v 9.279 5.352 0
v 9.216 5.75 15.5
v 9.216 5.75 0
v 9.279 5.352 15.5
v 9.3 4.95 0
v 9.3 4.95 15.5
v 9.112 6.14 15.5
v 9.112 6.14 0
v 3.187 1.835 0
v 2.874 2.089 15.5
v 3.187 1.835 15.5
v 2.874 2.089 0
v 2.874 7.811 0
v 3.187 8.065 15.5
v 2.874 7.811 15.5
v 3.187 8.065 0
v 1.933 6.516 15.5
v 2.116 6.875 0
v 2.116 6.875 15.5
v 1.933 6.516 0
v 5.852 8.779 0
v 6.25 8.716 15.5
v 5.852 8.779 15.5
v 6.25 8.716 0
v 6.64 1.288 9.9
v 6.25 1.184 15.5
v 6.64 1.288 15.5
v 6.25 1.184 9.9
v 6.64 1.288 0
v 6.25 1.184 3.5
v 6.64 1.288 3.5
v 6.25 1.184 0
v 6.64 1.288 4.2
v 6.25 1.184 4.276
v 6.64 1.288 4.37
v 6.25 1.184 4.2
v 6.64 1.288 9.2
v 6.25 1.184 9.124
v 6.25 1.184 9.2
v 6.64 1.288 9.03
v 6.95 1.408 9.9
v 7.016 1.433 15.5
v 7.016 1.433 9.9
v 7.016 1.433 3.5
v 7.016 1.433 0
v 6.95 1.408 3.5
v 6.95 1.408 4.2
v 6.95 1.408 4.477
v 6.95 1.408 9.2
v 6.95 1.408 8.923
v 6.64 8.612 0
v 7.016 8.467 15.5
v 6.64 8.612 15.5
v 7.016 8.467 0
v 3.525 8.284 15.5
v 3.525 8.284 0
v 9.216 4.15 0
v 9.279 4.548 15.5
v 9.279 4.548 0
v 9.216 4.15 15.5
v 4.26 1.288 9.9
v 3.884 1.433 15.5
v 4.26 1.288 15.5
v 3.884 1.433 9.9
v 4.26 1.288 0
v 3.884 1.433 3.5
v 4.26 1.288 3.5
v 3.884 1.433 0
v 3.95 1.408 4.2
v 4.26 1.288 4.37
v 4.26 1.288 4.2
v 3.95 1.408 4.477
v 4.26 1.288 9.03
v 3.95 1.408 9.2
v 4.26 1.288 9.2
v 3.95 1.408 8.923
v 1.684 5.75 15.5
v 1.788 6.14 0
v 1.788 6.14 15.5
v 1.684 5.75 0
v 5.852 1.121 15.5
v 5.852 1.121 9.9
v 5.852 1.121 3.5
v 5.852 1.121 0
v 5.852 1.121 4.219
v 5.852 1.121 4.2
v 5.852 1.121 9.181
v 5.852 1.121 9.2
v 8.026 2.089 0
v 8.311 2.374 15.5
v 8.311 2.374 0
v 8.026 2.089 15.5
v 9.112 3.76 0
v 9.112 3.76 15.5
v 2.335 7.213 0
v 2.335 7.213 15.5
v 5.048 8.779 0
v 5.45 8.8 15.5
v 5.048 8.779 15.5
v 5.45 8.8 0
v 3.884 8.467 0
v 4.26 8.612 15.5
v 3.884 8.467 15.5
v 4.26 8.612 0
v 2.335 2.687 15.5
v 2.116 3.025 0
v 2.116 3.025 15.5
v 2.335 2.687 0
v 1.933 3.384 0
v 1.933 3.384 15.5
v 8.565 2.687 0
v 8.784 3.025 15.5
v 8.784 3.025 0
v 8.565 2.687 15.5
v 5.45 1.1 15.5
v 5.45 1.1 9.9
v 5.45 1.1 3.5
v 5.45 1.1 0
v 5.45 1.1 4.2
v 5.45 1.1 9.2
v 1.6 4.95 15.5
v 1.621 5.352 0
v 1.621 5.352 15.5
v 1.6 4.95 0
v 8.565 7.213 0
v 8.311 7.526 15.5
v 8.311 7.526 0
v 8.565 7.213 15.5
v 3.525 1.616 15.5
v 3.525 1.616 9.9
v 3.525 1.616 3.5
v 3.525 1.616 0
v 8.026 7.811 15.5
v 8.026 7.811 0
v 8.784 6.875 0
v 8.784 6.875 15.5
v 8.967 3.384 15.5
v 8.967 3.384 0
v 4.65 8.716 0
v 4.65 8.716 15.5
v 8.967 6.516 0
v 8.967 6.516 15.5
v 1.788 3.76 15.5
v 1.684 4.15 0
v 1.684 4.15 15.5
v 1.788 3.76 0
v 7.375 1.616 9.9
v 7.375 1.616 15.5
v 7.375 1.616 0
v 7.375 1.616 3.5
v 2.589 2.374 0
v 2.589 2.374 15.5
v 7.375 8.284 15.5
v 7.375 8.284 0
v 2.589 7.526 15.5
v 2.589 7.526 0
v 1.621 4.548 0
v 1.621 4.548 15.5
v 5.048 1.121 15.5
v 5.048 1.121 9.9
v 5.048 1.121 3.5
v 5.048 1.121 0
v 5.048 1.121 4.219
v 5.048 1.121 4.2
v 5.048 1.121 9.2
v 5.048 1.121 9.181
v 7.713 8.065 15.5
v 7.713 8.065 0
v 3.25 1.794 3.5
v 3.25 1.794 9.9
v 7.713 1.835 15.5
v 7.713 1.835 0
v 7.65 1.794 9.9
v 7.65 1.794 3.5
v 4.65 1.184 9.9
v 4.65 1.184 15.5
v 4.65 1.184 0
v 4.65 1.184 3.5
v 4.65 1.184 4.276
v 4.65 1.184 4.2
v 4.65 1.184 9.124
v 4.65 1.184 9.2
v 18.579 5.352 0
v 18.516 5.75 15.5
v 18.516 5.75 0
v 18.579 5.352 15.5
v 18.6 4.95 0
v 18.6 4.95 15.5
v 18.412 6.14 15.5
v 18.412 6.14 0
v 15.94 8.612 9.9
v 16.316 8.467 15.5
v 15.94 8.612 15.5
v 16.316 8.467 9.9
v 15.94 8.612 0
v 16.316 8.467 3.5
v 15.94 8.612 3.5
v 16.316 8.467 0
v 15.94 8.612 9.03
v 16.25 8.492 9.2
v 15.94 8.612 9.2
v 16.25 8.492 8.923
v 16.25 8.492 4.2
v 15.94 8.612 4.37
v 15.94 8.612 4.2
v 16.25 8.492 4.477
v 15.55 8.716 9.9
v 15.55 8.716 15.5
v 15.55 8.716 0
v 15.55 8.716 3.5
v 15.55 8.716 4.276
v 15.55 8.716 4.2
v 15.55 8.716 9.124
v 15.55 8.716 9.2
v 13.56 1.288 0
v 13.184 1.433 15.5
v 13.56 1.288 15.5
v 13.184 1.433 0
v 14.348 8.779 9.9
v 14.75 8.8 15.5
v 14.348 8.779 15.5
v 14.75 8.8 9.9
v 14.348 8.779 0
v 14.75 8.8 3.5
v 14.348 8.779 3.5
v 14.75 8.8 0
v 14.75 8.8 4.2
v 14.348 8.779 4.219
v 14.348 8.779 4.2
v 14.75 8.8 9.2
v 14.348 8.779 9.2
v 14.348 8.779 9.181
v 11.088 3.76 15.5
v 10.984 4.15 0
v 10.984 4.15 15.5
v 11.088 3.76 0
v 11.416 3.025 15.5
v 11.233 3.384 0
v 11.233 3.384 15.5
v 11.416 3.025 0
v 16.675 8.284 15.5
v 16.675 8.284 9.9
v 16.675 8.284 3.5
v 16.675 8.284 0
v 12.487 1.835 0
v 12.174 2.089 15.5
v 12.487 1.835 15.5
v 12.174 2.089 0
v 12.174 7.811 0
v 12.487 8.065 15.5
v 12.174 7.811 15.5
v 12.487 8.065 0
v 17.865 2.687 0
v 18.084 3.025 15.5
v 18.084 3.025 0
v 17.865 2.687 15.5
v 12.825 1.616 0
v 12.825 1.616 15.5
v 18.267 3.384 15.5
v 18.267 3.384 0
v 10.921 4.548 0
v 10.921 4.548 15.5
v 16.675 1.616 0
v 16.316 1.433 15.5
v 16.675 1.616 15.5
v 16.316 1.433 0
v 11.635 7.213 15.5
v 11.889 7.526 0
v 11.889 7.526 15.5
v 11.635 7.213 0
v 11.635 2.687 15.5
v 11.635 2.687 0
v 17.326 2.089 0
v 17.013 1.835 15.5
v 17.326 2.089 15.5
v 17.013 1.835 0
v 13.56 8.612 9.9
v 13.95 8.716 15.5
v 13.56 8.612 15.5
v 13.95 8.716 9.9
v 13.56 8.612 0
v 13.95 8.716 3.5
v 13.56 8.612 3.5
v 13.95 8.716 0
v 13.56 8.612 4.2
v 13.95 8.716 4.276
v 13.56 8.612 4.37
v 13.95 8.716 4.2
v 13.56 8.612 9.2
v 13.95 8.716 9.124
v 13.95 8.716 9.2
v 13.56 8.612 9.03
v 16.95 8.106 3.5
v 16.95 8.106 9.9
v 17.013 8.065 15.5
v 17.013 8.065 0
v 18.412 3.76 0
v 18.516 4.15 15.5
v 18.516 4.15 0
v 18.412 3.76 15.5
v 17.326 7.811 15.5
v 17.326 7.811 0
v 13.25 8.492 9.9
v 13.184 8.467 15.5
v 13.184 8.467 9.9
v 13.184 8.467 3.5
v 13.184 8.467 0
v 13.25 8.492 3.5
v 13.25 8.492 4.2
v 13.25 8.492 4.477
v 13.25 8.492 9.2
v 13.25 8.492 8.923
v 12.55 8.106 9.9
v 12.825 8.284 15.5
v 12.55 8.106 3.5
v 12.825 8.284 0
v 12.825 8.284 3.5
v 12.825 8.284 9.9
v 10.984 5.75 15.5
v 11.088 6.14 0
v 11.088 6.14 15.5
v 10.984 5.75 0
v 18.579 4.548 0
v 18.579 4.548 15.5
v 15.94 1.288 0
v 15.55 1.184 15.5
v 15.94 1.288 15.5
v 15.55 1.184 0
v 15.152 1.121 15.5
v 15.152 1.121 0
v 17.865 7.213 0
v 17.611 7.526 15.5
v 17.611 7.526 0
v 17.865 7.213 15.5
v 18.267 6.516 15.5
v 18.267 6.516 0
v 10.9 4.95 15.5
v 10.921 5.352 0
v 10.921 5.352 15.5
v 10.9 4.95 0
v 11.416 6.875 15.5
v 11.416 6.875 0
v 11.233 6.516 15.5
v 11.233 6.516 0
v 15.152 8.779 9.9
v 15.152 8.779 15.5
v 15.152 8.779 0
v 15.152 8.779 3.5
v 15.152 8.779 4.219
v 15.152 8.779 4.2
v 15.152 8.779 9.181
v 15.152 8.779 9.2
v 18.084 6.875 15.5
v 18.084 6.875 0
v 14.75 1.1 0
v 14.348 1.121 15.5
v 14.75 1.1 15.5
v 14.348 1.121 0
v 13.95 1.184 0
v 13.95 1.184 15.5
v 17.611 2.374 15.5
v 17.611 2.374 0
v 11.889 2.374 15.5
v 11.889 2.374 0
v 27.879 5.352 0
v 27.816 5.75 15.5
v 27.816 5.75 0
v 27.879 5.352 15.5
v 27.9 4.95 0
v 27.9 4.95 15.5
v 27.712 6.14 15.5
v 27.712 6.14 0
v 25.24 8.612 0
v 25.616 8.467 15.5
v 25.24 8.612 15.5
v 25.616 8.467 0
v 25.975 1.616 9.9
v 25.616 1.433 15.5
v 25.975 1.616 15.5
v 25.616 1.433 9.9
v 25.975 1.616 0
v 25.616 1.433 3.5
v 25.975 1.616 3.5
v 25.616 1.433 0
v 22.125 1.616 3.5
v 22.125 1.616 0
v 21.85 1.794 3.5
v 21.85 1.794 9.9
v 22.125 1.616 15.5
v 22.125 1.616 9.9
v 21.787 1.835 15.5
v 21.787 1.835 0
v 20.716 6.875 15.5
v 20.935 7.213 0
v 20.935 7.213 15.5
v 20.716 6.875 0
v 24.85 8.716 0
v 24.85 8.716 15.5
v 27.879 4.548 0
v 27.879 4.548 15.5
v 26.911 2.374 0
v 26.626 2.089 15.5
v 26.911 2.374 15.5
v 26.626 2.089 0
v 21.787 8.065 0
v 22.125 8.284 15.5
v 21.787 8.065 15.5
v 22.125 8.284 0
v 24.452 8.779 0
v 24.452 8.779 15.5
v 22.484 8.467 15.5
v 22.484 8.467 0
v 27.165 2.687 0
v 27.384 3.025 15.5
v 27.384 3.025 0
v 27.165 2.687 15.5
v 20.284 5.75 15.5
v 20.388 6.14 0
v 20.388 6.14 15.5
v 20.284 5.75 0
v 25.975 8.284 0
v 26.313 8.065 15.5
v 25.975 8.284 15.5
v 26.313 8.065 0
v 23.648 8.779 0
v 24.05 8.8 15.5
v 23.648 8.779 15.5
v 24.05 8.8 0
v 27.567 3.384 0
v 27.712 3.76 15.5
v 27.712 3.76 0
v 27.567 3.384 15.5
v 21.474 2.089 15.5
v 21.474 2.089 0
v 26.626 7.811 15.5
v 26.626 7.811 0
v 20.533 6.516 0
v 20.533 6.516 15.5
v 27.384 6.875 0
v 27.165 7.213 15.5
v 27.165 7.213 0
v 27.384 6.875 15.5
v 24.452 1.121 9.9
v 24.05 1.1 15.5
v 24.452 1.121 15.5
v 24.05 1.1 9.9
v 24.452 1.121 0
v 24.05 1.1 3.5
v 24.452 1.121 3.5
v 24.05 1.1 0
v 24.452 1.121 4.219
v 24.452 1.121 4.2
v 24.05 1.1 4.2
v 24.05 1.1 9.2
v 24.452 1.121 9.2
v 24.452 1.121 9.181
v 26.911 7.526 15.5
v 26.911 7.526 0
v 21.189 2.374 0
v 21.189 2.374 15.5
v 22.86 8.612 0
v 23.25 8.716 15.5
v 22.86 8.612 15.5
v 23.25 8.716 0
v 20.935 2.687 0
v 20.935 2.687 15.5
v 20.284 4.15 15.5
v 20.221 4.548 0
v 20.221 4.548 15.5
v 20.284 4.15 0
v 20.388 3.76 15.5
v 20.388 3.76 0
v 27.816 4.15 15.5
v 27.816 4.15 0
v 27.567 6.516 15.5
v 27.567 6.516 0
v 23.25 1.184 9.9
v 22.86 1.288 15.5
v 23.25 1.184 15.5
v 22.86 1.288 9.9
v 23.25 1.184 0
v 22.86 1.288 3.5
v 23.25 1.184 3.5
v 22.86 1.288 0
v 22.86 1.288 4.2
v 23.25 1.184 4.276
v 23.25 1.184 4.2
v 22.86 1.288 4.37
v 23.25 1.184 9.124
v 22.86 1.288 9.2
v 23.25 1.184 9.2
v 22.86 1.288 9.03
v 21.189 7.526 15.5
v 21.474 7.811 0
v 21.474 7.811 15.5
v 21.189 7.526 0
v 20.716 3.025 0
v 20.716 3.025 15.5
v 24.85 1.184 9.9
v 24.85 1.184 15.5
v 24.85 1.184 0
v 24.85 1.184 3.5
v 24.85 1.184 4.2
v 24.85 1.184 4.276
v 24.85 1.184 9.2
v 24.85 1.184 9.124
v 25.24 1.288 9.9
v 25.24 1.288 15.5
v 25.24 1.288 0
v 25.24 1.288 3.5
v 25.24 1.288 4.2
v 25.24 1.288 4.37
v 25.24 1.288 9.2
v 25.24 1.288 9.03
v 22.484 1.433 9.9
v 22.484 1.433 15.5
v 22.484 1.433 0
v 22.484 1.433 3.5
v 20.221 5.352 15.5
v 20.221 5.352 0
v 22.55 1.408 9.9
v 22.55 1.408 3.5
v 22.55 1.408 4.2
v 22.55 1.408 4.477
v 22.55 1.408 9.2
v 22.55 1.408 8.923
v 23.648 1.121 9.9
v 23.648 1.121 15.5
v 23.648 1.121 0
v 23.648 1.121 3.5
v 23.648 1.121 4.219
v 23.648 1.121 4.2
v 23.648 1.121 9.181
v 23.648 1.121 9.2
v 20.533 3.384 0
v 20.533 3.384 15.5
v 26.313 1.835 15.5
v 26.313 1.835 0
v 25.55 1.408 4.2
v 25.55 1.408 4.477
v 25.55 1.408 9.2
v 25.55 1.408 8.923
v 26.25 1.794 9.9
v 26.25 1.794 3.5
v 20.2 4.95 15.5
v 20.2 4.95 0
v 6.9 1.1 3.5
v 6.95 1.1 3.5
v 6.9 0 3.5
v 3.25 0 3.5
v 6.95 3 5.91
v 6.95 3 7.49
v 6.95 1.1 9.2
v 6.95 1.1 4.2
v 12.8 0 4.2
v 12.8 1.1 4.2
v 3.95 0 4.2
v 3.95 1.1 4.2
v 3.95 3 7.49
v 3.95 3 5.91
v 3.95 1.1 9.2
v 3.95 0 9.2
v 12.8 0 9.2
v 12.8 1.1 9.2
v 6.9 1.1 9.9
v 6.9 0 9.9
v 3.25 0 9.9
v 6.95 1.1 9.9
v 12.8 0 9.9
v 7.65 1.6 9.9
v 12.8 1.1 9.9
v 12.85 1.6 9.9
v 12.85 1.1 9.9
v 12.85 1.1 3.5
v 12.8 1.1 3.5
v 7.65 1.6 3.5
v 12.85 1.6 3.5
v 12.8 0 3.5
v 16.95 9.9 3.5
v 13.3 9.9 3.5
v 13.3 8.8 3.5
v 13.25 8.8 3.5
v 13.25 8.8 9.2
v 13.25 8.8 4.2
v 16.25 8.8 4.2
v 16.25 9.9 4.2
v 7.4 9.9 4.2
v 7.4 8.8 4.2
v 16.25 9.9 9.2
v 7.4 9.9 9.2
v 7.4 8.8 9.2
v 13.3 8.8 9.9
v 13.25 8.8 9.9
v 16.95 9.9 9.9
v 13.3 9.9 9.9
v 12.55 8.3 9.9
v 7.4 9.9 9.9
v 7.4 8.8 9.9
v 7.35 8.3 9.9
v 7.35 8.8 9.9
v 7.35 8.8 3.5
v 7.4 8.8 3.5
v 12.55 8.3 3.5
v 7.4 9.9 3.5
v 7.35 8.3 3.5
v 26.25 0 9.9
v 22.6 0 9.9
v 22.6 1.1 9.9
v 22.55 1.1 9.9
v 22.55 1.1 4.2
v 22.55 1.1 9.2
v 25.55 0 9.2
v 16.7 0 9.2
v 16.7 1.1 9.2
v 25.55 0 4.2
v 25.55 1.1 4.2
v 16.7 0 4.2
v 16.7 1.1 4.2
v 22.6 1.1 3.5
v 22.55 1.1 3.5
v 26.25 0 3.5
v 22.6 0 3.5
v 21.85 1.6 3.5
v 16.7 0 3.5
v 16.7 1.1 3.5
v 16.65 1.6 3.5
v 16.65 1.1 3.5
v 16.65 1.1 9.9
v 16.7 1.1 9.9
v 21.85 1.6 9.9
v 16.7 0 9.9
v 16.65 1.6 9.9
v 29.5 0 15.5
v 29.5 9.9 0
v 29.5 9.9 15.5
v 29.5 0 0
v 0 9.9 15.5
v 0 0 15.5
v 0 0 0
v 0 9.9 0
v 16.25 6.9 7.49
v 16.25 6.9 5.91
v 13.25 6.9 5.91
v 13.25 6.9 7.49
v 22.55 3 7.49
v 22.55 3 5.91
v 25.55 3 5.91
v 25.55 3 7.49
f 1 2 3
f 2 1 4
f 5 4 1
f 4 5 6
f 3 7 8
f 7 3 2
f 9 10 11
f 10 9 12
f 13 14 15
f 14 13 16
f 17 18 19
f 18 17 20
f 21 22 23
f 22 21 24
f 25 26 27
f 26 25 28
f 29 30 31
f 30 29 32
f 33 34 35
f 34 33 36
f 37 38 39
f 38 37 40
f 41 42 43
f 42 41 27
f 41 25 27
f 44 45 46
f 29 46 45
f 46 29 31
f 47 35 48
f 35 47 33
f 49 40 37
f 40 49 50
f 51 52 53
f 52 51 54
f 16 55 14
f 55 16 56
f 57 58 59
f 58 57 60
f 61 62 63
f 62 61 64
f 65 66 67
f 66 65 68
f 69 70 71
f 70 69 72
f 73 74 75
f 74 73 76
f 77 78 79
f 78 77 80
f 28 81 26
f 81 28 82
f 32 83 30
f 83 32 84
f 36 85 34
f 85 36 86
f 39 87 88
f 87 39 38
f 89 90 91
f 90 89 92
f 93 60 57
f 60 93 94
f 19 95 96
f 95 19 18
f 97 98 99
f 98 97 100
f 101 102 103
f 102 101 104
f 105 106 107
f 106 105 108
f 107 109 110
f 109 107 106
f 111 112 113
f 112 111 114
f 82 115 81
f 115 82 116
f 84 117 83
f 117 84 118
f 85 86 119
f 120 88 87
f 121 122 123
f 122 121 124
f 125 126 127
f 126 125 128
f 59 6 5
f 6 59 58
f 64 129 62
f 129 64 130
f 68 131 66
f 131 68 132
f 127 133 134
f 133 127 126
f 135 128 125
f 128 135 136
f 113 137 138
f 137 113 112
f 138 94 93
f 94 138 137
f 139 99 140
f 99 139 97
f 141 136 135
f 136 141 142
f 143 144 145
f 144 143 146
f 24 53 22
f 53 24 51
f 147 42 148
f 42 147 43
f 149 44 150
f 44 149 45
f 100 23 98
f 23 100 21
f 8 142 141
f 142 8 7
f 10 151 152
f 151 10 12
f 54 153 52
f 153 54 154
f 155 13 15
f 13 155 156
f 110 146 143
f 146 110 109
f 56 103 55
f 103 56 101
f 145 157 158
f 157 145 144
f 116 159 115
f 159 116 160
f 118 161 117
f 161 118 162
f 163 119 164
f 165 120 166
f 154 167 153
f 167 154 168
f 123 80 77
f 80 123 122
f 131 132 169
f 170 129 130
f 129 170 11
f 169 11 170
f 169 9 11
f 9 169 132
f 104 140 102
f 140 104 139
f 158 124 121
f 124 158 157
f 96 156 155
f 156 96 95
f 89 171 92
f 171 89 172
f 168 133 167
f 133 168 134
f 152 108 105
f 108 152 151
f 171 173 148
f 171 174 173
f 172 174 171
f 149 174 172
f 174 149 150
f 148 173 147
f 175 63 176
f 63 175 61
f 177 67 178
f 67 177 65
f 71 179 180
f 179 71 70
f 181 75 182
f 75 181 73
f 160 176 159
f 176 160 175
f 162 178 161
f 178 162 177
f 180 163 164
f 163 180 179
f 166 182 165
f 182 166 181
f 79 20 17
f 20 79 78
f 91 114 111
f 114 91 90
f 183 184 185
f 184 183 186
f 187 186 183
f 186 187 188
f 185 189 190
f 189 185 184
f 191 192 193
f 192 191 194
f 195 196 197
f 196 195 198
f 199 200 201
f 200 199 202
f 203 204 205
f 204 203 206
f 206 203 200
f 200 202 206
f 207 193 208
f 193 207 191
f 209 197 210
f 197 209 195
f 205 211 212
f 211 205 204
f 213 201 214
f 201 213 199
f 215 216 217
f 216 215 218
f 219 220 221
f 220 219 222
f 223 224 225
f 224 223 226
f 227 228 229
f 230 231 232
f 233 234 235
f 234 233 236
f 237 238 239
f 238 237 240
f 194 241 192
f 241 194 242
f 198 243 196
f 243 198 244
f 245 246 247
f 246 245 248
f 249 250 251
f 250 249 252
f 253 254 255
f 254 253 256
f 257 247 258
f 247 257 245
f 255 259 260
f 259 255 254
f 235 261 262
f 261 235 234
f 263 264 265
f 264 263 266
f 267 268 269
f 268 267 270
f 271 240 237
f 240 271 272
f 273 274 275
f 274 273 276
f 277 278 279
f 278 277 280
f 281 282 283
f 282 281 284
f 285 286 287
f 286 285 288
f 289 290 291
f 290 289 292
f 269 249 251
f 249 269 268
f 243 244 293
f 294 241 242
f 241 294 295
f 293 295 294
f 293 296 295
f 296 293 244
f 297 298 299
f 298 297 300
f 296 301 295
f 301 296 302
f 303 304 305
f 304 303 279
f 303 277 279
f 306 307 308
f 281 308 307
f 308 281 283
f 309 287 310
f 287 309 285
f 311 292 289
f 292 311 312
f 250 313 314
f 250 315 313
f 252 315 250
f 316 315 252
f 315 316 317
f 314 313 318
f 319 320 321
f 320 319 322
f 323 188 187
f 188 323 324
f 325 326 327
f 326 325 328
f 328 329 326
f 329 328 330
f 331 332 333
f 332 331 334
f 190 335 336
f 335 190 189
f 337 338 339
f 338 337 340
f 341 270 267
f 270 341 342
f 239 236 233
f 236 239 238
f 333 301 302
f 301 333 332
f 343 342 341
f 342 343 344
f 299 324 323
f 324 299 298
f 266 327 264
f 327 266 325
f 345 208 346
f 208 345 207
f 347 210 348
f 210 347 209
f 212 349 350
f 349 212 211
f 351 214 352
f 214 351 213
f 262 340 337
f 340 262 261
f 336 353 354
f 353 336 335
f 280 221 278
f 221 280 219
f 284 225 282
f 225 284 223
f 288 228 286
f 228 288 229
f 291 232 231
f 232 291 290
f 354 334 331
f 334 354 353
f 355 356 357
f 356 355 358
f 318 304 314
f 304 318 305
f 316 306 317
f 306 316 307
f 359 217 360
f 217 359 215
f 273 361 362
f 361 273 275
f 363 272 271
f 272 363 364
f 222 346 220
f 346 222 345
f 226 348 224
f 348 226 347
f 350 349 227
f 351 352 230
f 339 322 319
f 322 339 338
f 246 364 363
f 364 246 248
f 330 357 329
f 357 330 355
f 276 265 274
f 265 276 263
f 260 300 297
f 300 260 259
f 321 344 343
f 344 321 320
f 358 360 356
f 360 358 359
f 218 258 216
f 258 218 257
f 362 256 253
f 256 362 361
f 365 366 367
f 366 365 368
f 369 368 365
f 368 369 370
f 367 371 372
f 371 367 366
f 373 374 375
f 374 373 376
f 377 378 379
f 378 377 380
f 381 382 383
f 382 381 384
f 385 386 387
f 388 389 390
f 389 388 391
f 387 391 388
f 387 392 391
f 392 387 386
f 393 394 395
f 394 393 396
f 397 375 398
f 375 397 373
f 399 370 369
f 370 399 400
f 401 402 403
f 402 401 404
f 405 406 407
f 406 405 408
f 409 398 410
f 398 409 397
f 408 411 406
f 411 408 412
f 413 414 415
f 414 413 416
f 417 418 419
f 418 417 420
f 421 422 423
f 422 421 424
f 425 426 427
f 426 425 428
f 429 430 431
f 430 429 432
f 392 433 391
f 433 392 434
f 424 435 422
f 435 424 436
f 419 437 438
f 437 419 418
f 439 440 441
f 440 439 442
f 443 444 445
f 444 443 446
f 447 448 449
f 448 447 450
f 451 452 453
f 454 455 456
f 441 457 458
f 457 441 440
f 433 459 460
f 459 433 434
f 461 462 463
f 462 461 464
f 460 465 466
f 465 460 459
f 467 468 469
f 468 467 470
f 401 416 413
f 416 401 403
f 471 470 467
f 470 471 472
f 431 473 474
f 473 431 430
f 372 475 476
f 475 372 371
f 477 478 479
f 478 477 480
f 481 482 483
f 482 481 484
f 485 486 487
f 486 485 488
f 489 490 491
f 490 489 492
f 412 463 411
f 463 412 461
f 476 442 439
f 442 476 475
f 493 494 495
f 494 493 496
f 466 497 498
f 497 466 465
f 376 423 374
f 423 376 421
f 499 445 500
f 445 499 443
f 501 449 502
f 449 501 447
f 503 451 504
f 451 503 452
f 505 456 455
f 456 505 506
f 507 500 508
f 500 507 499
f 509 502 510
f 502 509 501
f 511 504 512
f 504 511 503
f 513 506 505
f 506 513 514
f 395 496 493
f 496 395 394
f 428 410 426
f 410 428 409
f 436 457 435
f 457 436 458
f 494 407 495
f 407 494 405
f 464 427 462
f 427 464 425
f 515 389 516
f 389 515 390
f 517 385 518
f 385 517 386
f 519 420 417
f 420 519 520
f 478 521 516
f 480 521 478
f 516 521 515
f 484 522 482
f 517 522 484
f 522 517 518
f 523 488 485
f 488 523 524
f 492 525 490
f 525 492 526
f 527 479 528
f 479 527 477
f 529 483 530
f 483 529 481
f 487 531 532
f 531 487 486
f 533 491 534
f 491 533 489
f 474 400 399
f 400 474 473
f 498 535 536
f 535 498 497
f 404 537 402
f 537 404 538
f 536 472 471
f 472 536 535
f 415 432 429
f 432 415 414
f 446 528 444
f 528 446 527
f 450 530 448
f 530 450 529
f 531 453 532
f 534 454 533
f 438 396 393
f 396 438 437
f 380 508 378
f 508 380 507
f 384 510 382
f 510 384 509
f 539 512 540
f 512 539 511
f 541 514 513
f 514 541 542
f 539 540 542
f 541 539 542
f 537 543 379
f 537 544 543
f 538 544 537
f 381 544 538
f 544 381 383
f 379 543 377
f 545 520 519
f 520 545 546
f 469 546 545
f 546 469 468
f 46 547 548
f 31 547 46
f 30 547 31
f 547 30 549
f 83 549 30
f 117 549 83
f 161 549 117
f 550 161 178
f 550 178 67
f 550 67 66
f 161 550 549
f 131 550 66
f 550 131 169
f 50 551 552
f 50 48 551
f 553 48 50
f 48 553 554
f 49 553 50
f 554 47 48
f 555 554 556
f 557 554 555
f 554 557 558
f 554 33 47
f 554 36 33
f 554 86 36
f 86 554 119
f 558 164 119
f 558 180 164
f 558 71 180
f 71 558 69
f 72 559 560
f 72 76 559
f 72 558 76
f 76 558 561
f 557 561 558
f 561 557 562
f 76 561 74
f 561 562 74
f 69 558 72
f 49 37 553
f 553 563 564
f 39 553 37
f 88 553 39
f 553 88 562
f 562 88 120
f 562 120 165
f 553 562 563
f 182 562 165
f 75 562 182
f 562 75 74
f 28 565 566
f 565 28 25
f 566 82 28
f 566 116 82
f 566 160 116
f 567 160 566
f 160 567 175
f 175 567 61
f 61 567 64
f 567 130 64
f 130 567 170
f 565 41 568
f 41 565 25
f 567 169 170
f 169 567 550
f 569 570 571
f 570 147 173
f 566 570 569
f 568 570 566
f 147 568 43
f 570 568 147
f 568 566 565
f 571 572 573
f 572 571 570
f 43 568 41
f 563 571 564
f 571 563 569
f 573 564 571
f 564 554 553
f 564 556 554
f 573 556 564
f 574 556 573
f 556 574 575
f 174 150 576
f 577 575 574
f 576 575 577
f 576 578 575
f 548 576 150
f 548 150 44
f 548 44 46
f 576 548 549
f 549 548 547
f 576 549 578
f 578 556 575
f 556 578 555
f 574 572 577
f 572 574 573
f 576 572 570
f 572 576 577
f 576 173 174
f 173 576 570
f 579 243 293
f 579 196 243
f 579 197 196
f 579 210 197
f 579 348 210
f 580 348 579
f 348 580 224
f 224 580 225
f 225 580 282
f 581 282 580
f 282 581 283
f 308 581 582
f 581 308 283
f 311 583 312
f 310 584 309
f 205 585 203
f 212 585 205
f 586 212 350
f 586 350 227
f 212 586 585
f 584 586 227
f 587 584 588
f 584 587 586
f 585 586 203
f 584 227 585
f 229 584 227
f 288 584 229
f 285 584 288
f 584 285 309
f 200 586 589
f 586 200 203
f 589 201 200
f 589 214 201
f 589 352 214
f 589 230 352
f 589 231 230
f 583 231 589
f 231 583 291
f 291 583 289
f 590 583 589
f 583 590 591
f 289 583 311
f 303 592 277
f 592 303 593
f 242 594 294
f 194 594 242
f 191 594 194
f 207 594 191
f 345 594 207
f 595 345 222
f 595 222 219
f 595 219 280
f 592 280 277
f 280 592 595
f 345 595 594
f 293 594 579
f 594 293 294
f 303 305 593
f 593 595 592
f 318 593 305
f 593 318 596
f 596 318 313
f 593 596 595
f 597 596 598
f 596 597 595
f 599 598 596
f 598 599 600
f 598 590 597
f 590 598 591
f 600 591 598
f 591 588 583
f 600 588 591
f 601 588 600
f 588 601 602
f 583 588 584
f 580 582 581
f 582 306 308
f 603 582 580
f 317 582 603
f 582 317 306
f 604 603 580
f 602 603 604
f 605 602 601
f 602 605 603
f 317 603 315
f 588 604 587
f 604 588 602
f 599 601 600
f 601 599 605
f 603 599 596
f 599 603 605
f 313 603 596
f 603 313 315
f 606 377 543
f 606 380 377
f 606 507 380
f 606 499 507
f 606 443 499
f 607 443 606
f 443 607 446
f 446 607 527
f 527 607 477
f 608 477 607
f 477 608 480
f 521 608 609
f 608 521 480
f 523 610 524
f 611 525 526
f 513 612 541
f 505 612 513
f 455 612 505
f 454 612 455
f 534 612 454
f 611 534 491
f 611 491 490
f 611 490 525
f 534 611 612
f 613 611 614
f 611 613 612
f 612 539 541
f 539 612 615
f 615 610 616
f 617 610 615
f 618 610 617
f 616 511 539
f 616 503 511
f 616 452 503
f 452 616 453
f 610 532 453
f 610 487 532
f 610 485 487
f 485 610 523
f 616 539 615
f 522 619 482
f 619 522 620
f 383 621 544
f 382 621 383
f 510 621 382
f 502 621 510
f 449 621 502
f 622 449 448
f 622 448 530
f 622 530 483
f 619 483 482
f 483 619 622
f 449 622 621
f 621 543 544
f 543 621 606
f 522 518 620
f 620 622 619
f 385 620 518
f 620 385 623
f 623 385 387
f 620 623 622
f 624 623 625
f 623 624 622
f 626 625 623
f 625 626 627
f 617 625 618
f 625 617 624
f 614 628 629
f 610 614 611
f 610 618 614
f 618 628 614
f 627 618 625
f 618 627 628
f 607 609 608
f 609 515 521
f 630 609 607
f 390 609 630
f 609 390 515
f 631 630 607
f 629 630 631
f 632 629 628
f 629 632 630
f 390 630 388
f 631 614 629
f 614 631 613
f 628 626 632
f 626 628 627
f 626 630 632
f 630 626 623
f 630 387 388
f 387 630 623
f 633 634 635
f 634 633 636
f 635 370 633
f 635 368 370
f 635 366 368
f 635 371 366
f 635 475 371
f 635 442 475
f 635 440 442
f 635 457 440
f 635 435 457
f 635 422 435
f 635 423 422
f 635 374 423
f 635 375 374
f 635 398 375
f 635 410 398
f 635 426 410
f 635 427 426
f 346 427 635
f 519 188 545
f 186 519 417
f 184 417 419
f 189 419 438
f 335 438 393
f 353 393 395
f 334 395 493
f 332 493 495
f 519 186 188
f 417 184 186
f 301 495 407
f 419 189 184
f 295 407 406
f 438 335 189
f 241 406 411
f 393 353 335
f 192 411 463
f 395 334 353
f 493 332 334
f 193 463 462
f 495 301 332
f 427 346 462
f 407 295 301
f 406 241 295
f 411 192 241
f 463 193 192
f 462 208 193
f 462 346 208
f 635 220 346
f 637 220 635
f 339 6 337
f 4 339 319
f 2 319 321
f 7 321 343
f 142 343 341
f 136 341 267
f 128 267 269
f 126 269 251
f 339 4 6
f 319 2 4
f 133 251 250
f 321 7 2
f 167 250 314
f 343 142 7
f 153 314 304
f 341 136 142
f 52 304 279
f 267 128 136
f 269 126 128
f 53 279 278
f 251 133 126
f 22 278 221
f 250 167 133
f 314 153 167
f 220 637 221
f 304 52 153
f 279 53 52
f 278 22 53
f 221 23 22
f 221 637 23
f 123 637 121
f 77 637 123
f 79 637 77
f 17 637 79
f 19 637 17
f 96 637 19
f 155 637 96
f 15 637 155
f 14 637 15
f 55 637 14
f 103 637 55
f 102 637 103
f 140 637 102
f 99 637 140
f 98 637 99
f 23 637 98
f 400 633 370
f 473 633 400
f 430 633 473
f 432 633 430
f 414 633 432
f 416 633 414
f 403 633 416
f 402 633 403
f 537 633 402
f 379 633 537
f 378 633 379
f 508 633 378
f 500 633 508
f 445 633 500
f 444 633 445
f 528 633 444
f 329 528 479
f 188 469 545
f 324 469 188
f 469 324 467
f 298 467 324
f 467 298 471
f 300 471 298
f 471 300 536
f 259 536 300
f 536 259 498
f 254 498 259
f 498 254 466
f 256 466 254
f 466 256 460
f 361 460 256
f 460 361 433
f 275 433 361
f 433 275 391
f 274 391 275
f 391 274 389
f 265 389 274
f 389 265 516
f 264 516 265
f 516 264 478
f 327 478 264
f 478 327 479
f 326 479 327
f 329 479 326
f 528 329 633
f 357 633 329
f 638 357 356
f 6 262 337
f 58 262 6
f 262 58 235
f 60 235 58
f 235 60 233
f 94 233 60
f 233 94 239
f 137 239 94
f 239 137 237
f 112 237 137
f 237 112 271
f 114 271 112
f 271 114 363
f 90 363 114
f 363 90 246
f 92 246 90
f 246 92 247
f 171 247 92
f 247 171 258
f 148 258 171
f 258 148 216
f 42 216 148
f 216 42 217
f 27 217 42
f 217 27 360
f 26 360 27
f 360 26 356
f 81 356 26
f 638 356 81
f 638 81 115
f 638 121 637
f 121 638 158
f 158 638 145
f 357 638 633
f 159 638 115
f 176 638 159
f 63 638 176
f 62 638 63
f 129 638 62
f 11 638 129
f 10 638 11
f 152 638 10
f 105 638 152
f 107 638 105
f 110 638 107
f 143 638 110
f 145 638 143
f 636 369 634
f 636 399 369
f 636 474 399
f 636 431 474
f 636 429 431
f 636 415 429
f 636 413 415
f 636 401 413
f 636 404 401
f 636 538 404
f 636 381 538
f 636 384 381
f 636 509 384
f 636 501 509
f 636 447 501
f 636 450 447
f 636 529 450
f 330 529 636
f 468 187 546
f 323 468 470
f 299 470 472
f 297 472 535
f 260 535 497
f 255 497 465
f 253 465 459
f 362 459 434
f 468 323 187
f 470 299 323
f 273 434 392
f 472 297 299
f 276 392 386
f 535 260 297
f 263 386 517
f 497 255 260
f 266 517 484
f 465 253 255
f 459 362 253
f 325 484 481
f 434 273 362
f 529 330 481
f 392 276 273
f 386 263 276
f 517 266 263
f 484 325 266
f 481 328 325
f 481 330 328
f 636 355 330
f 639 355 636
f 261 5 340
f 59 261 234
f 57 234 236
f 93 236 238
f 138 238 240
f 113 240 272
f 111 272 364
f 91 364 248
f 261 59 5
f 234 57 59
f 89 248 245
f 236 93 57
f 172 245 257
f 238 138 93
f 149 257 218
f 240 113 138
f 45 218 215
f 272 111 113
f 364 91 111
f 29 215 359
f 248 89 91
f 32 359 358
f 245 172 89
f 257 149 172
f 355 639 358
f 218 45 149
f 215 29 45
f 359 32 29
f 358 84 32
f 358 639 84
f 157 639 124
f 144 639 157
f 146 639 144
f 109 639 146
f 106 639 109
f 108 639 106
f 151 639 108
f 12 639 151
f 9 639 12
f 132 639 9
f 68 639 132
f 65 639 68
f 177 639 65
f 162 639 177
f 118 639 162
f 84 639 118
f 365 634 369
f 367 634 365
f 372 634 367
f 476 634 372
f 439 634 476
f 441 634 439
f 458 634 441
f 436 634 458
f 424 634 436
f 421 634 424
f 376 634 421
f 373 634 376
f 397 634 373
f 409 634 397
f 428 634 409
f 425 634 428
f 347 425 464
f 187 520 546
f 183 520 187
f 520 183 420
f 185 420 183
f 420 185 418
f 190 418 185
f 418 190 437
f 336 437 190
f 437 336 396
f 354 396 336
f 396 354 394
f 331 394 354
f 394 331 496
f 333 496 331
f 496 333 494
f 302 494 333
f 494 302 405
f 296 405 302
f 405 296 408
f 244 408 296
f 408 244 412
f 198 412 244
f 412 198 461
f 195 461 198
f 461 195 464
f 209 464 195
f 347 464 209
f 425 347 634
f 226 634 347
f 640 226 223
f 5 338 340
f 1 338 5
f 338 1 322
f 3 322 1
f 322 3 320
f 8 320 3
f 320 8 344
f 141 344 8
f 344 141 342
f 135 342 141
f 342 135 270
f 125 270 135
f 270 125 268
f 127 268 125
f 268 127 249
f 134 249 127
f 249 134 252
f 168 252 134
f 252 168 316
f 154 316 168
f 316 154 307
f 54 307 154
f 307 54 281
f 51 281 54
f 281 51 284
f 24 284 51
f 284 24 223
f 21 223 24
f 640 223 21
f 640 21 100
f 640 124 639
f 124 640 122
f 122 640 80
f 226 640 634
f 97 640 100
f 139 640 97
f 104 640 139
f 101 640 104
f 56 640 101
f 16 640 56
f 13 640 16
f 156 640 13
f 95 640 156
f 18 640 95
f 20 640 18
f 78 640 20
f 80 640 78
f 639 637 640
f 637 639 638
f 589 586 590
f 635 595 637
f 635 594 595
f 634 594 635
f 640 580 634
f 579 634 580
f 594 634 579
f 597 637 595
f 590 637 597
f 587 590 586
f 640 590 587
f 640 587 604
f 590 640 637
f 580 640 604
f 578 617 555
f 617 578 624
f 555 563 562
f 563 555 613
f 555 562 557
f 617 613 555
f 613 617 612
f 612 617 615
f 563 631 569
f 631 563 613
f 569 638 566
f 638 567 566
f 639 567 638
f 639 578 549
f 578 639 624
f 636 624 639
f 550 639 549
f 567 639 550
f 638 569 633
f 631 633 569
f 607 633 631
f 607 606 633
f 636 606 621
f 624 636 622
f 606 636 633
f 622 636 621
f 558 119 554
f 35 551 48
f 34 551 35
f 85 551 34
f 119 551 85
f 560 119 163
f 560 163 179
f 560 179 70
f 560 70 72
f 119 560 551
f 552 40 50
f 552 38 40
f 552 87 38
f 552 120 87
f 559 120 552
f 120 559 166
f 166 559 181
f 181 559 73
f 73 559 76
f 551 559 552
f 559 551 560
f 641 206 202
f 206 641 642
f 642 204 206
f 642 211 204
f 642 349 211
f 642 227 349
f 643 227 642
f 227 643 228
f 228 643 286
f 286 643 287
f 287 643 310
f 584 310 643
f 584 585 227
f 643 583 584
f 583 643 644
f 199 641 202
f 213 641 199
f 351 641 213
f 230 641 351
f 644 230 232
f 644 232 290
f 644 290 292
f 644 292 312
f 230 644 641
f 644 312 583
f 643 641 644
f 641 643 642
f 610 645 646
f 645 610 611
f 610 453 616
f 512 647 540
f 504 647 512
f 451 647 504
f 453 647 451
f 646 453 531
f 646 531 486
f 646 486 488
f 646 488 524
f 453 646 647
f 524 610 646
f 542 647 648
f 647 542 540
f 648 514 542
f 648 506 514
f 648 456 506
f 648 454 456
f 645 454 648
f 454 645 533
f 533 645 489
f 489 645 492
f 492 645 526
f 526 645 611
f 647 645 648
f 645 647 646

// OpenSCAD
// Hex bit holder v2
// greater holding force
// KBS3056 02.07.2019

slot_num                = 3;
bit_separate_space      = 1.6; 
holder_height           = 15.5;
side_wall_thickness     = 1.1;

//advanced
hole_diam               = 7.7;  //for bit 6.33/7.14mm diameter. 4.9mm indentation diameter 
latch_thickness         = 1.9; 
latch_height            = 5;  
latch_width             = 3;
latch_pos_z             = 4.2; 
$fn                     = 60;
spring_thickness        = 1.1;

//no need to change
spring_length           = 5.9; 


union(){
    difference(){
        cube([slot_num * (hole_diam + bit_separate_space) + bit_separate_space, 2 * side_wall_thickness + hole_diam, holder_height]);
        translate([hole_diam / 2 + bit_separate_space, 0, 0])
            for(n = [0 : slot_num - 1])
                translate([n * (hole_diam + bit_separate_space), hole_diam / 2 + side_wall_thickness, -0.05])
                    cylinder(h = holder_height + 0.1, d = hole_diam);
//difference
        translate([hole_diam / 2 + bit_separate_space - latch_width / 2, 0, 0])           
        for(n = [0 : slot_num - 1])  
            
            if(n % 2 == 0)
                if(n == 0)
                    translate([n * (hole_diam + bit_separate_space) + latch_width, side_wall_thickness + hole_diam / 2 - 0.2, latch_pos_z + latch_height])
                        rotate([0, 180, 0])
                            cutter(latch_height, latch_width);
                else
                    translate([n * (hole_diam + bit_separate_space), side_wall_thickness + hole_diam / 2 - 0.2, latch_pos_z])
                        cutter(latch_height, latch_width);
            
            else
                translate([n * (hole_diam + bit_separate_space), side_wall_thickness + hole_diam / 2 + 0.2, latch_pos_z + latch_height])
                    rotate([0, 180, 180])
                        cutter(latch_height, latch_width);
    }   
    
//union
    translate([hole_diam / 2 + bit_separate_space - latch_width / 2, 0, 0])           
        for(n = [0 : slot_num - 1])  
            
            if(n % 2 == 0)
                translate([n * (hole_diam + bit_separate_space), side_wall_thickness, latch_pos_z])
                    latch(latch_height, latch_thickness);
            
            else
                translate([n * (hole_diam + bit_separate_space) + latch_width, side_wall_thickness + hole_diam, latch_pos_z])
                    rotate([0, 0, 180])
                        latch(latch_height, latch_thickness);
}   

module cutter(latch_height, latch_width) {
    union(){
        rotate([90, 0, 0])
            linear_extrude(side_wall_thickness + hole_diam / 2 )
                polygon([[0, 0], [latch_width, 0], [latch_width, latch_height], [0, latch_height], [0, latch_height + 0.7], [latch_width + 0.7, latch_height + 0.7], [latch_width + 0.7, -0.7], [0, -0.7]]);
        translate([ -spring_length + 0.05, - (side_wall_thickness + hole_diam / 2), -0.7])
            cube([spring_length, spring_thickness + 0.2, 0.7]);
        translate([ -spring_length + 0.05, - (side_wall_thickness + hole_diam / 2), latch_height])
            cube([spring_length, spring_thickness + 0.2, 0.7]);
        translate([ -spring_length, -(0.3 + hole_diam / 2 + side_wall_thickness - spring_thickness - 0.5), -0.7])
            cube([spring_length, 0.5, latch_height + 2 * 0.7]);
        translate([-0.7, -hole_diam / 2 - side_wall_thickness + spring_thickness + 0.2, -0.7])
            cube([0.7, side_wall_thickness + hole_diam / 2 , latch_height + 2 * 0.7]);
    }
}

module latch(latch_height, latch_thickness) {
    rotate([90, 0, 90])
        linear_extrude(latch_width)
            polygon([[0, 0], [0, latch_height], [latch_thickness, latch_height - latch_thickness * 0.9], [latch_thickness, latch_thickness * 0.9]]);
}

assert(!(latch_height / latch_thickness < 1.875)); //too large 'latch_thickness' or too small 'latch_height'
assert(!(side_wall_thickness < 1.0)); //too small 'side_wall_thickness'
assert(!(slot_num < 1.3)); //'slot_num' must be larger than "1"
assert(!(spring_thickness > side_wall_thickness)); //too large 'spring_thickness' or too small 'side_wall_thickness'
assert(!(spring_length / (hole_diam + bit_separate_space) > 0.64)); //too large 'spring_length' or too small 'side_wall_thickness'
assert(!( latch_height > holder_height - latch_pos_z - 1.5)); //too large 'latch_height' or too small 'holder_height'
assert(!( latch_width > hole_diam / 2)); //too large 'latch_width'
assert(!( 0> 1.3)); //'slot_num' must be larger than "1"
